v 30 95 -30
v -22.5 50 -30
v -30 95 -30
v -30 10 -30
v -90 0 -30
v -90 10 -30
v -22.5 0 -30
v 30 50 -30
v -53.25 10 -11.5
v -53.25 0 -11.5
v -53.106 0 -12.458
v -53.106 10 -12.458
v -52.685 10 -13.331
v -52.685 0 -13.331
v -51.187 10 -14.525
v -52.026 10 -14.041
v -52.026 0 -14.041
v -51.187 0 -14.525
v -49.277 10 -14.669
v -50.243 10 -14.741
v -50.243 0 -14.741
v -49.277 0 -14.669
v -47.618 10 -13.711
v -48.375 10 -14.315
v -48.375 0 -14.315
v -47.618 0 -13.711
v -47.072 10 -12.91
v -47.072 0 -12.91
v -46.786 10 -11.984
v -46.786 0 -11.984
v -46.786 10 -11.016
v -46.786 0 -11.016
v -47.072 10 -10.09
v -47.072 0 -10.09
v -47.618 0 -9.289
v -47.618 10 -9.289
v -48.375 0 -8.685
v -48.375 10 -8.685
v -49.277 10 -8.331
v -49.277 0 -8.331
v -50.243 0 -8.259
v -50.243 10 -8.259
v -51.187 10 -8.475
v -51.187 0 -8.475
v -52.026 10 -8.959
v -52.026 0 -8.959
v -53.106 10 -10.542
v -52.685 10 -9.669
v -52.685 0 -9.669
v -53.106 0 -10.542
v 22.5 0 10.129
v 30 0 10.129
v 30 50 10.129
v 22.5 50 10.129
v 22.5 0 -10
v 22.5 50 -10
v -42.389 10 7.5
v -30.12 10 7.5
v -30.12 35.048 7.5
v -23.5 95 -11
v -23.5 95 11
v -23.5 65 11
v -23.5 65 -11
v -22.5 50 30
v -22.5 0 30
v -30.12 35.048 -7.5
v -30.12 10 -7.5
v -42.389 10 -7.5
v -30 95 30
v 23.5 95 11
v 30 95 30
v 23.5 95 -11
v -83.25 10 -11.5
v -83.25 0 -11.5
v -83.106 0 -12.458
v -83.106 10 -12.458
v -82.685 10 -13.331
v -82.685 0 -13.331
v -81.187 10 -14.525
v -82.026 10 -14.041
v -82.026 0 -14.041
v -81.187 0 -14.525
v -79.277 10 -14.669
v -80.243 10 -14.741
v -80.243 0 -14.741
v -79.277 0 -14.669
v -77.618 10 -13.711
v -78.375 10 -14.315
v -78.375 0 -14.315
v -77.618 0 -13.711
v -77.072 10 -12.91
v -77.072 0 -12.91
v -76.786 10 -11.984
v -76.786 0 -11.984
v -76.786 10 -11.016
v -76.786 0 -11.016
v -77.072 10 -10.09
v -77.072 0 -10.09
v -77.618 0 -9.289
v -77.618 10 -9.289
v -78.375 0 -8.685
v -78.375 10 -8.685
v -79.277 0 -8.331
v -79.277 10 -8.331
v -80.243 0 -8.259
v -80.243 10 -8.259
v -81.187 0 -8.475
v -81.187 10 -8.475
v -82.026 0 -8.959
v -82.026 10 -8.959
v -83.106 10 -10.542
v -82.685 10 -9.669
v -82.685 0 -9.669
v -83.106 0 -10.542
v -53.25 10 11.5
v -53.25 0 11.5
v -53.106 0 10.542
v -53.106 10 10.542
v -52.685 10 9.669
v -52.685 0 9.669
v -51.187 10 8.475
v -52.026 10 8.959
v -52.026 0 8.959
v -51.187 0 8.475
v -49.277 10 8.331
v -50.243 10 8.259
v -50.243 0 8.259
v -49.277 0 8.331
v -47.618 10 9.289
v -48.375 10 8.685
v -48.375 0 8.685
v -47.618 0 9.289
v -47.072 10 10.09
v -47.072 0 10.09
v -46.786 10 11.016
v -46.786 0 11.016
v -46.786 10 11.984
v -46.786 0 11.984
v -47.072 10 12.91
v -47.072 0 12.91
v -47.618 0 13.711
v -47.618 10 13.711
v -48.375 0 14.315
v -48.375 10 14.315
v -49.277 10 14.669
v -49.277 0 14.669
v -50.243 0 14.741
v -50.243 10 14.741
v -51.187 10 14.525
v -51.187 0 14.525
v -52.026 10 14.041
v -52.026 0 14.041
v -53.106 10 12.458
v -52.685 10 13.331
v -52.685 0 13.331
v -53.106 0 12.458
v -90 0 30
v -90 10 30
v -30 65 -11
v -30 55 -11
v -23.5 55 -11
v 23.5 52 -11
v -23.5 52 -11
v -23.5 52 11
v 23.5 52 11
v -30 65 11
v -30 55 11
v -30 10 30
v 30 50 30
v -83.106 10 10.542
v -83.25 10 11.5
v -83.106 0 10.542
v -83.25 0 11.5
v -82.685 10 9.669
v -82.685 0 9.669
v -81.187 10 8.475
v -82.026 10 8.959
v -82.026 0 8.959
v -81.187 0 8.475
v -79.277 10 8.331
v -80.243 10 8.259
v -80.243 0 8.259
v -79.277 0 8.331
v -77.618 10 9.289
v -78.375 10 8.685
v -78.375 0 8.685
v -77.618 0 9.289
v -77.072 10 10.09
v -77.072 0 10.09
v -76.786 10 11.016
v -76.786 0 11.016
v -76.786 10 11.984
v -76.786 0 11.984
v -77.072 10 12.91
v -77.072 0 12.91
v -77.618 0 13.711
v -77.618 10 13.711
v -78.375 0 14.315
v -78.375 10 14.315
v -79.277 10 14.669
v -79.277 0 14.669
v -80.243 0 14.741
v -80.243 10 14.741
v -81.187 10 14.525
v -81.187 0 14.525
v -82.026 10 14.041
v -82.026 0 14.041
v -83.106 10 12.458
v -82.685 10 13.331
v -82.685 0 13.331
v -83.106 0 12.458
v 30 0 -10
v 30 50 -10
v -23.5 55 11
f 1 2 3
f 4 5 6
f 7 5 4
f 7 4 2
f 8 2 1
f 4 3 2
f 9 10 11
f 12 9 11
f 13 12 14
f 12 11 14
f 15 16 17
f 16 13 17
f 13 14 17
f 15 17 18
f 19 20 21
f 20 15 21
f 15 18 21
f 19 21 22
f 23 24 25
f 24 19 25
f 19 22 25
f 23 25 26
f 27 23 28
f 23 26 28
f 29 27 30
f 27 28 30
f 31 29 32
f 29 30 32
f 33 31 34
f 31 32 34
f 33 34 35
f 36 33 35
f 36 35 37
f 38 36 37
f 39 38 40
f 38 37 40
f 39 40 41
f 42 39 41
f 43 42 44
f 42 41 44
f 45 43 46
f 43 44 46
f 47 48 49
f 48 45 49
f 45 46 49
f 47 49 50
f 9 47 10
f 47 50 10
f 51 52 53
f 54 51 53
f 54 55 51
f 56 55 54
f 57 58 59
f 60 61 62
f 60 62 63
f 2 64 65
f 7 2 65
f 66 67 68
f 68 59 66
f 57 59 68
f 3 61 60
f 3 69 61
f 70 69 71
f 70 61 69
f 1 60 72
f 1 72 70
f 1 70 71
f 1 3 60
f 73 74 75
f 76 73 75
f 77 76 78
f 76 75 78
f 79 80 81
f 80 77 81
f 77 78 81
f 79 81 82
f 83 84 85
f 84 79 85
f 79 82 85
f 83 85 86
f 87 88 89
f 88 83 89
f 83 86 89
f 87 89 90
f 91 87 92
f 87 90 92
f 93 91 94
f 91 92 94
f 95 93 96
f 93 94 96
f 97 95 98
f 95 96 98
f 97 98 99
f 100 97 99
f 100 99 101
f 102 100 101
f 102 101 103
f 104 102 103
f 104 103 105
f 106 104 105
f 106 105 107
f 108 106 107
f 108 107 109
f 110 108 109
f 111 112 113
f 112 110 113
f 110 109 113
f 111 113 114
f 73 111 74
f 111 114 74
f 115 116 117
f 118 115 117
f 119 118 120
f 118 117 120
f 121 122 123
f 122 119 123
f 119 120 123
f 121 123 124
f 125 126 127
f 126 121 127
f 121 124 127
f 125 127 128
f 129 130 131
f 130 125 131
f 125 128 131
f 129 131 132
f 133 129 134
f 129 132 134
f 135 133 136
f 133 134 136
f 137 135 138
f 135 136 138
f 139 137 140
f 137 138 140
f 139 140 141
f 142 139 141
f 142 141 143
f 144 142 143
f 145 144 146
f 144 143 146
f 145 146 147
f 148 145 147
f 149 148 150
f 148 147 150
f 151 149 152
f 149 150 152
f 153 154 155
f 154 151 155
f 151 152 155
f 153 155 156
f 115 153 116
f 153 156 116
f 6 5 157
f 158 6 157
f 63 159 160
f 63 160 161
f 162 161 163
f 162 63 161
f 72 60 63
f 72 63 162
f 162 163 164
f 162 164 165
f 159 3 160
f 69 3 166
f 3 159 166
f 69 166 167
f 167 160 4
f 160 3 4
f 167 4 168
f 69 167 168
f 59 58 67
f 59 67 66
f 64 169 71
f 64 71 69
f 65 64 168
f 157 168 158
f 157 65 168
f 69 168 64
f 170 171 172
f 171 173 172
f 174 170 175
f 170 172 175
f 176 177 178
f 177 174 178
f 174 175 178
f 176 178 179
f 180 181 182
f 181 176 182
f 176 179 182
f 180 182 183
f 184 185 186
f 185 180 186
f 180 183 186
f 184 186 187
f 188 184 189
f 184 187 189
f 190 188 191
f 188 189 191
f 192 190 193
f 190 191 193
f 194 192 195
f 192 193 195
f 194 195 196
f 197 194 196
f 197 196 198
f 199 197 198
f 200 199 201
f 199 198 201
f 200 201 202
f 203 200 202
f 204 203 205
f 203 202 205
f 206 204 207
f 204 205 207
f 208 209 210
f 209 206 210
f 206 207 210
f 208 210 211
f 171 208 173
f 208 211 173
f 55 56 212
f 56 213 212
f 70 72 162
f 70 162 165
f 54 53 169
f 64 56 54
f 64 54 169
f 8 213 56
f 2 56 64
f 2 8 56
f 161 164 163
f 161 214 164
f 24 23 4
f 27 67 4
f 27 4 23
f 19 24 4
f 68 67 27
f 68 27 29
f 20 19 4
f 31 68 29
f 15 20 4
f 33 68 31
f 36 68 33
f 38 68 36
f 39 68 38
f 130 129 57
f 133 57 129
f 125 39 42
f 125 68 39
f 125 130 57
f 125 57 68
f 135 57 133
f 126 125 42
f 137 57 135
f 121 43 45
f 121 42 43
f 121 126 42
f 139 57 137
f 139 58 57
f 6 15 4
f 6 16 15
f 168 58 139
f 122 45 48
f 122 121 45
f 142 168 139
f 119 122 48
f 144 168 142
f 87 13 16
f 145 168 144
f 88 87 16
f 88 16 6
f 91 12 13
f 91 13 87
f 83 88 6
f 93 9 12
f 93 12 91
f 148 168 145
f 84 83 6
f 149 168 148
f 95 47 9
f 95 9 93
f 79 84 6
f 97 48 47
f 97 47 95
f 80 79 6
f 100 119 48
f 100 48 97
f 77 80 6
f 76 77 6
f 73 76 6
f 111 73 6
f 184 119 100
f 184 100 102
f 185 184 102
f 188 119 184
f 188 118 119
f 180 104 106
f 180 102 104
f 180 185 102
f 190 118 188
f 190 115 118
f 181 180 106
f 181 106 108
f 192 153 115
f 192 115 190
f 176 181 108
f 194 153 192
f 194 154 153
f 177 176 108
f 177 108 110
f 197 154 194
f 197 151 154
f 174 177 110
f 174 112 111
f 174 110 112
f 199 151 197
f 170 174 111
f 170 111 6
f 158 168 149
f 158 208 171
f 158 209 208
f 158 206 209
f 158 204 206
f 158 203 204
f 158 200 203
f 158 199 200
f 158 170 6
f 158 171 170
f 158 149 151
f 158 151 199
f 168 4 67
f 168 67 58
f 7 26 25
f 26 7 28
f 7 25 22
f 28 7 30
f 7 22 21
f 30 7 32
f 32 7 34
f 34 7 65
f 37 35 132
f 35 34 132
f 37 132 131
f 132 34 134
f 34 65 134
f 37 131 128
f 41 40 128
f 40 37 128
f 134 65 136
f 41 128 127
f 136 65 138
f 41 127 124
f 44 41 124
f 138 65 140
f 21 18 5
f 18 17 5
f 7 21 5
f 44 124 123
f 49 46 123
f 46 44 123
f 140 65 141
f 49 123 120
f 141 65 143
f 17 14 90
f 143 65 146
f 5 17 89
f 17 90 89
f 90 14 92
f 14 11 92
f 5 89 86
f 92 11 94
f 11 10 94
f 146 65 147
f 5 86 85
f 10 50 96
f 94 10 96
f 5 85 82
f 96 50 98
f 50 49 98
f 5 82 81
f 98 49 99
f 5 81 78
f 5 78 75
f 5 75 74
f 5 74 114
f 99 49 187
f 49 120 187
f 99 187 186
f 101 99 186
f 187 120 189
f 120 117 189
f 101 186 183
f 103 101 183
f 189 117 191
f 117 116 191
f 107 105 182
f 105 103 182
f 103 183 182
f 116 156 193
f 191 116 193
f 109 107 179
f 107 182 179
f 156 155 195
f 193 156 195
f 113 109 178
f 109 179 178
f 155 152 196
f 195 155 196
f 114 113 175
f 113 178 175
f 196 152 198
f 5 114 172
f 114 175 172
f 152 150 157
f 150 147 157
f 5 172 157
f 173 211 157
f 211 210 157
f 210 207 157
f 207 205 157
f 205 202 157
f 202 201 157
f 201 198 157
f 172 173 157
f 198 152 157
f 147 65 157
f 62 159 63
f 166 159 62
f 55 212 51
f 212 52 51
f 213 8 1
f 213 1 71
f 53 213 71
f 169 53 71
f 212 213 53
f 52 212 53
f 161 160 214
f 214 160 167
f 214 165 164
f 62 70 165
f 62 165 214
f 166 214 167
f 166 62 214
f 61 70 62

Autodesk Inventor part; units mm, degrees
ref_plane "YZ Plane" through (0, 0, 0) normal (1, 0, 0) x (0, 1, 0)
ref_plane "XZ Plane" through (0, 0, 0) normal (0, 1, 0) x (-1, 0, 0)
ref_plane "XY Plane" through (0, 0, 0) normal (0, 0, 1) x (1, 0, 0)
sketch "Boceto2" plane through (0, 0, 0) normal (0, 1, 0) x (-1, 0, 0)
  line L0 (-30, 30) -> (30, 30)
  line L1 (30, 30) -> (30, -30)
  line L2 (30, -30) -> (-30, -30)
  line L3 (-30, -30) -> (-30, 30)
  line L4 (-30, 30) -> (30, -30) construction
  line L5 (30, 30) -> (-30, -30) construction
  point P0 (0, 0)
  dimension "d0" = 60
  dimension "d1" = 60
extrude "Extrusión1" add sketch "Boceto2" along normal blind 55
sketch "Boceto3" plane through (30, 0, -30) normal (0, 0, -1) x (-1, 0, 0)
  line L0 (7.5, 50) -> (52.5, 50)
  line L1 (52.5, 50) -> (52.5, 0)
  line L2 (52.5, 0) -> (7.5, 0)
  line L3 (7.5, 0) -> (7.5, 50)
  line L4 (0, 0) -> (60, 0) projected
  point P0 (30, 0)
  dimension "d4" = 45
  dimension "d5" = 50
  dimension "d6" = 0
extrude "Extrusión2" cut sketch "Boceto3" against normal blind 190
sketch "Boceto5" plane through (0, 0, 0) normal (0, 1, 0) x (-1, 0, 0)
  line L0 (30, -30) -> (30, 30) projected
  line L1 (30, 0) -> (60, 0)
  line L2 (90, 30) -> (30, 30)
  line L3 (30, 30) -> (30, -30)
  line L4 (30, -30) -> (90, -30)
  line L5 (90, -30) -> (90, 30)
  line L6 (90, 30) -> (30, -30) construction
  line L7 (30, 30) -> (90, -30) construction
  circle A0 centre (50, 11.5) radius 3.25
  circle A1 centre (50, -11.5) radius 3.25
  circle A2 centre (80, 11.5) radius 3.25
  circle A3 centre (80, -11.5) radius 3.25
  point P0 (0, 0)
  dimension "d16" = 30
  dimension "d17" = 60
  dimension "d18" = 60
  dimension "d19" = 6.5
  dimension "d20" = 20
  dimension "d21" = 18.5
  dimension "d22" = 23
  dimension "d23" = 6.5
  dimension "d24" = 30
  dimension "d25" = 18.5
extrude "Extrusión4" add sketch "Boceto5" along normal blind 10
sketch "Boceto6" plane through (0, 55, 0) normal (0, 1, 0) x (1, 0, 0)
  line L0 (-30, 30) -> (-30, -30) projected
  line L1 (30, -30) -> (-30, -30)
  line L2 (-30, -30) -> (-30, 30)
  line L3 (-30, 30) -> (30, 30)
  line L4 (30, 30) -> (30, -30)
  line L5 (30, -30) -> (-30, 30) construction
  line L6 (-30, -30) -> (30, 30) construction
  point P0 (0, 0)
  dimension "d28" = 60
extrude "Extrusión5" add sketch "Boceto6" along normal blind 40
sketch "Boceto7" plane through (0, 95, 0) normal (0, 1, 0) x (1, 0, 0)
  line L0 (-23.5, 11) -> (23.5, 11)
  line L1 (23.5, 11) -> (23.5, -11)
  line L2 (23.5, -11) -> (-23.5, -11)
  line L3 (-23.5, -11) -> (-23.5, 11)
  line L4 (-23.5, 11) -> (23.5, -11) construction
  line L5 (23.5, 11) -> (-23.5, -11) construction
  point P0 (0, 0)
  dimension "d31" = 47
  dimension "d32" = 22
extrude "Extrusión6" cut sketch "Boceto7" against normal blind 43
sketch "Boceto8" plane through (-30, 0, 30) normal (-1, 0, 0) x (0, 0, 1)
  line L0 (-60, 55) -> (-44, 55) projected
  line L1 (0, 55) -> (-16, 55) projected
  line L2 (-44, 55) -> (-16, 55)
  line L3 (-41, 65) -> (-19, 65)
  line L4 (-19, 65) -> (-19, 55)
  line L5 (-19, 55) -> (-41, 55)
  line L6 (-41, 55) -> (-41, 65)
  line L7 (-41, 65) -> (-19, 55) construction
  line L8 (-19, 65) -> (-41, 55) construction
  line L9 (-16, 55) -> (-16, 95) projected
  line L10 (-44, 55) -> (-44, 95) projected
  point P0 (-30, 0)
  point P1 (-30, 60)
  point P2 (-41, 55)
  point P3 (-19, 55)
  point P4 (0, 95)
  point P5 (-60, 95)
  point P6 (-41, 60)
  dimension "d35" = 22
  dimension "d36" = 10
  dimension "d37" = 0
  dimension "d53" = 3
  dimension "d54" = 3
extrude "Extrusión7" cut sketch "Boceto8" against normal blind 10
ref_plane "Plano de trabajo1" through (30, 55, 0) normal (0, 0, -1) x (-1, 0, 0)
sketch "Boceto10" plane through (30, 55, 0) normal (0, 0, -1) x (-1, 0, 0)
  line L0 (60.12, -45) -> (60.12, 17.4198)
  line L1 (60.12, -45) -> (60.12, 13.5667)
  line L2 (60.12, -45) -> (137.1989, -45)
  line L3 (60.12, -19.9519) -> (80.5233, -61.6073)
  line L4 (120, -45) -> (60, -45) projected
  point P0 (30, -55)
  point P1 (72.3889, -45)
  dimension "d41" = 0
extrude "Extrusión8" add sketch "Boceto10" along normal mid plane 15
sketch "Boceto11" plane through (30, 0, 30) normal (1, 0, 0) x (0, 0, -1)
  line L0 (30, 0) -> (30, 50)
  line L1 (60, 50) -> (0, 50) projected
  line L2 (0, 0) -> (60, 0) projected
  line L3 (20, 50) -> (40, 50)
  line L4 (40, 50) -> (40, 0)
  line L5 (40, 0) -> (20, 0)
  line L6 (20, 0) -> (20, 50)
  line L7 (20, 50) -> (40, 0) construction
  line L8 (40, 50) -> (20, 0) construction
  line L9 (60, 0) -> (60, 95) projected
  line L10 (40, 50) -> (60, 50)
  line L11 (60, 50) -> (60, 0)
  line L12 (60, 0) -> (40, 0)
  line L13 (40, 0) -> (40, 50)
  line L14 (0, 0) -> (0, 95) projected
  line L15 (19.8706, 50) -> (0, 50)
  line L16 (0, 50) -> (0, 0)
  line L17 (0, 0) -> (19.8706, 0)
  line L18 (19.8706, 0) -> (19.8706, 50)
  point P0 (30, 25)
  dimension "d55" = 20
extrude "Extrusión9" cut sketch "Boceto11" against normal blind 10 contours L4 L1 L9 L2 | L2 L14 L1 L18
properties part number "depth_camera_support_v2"
